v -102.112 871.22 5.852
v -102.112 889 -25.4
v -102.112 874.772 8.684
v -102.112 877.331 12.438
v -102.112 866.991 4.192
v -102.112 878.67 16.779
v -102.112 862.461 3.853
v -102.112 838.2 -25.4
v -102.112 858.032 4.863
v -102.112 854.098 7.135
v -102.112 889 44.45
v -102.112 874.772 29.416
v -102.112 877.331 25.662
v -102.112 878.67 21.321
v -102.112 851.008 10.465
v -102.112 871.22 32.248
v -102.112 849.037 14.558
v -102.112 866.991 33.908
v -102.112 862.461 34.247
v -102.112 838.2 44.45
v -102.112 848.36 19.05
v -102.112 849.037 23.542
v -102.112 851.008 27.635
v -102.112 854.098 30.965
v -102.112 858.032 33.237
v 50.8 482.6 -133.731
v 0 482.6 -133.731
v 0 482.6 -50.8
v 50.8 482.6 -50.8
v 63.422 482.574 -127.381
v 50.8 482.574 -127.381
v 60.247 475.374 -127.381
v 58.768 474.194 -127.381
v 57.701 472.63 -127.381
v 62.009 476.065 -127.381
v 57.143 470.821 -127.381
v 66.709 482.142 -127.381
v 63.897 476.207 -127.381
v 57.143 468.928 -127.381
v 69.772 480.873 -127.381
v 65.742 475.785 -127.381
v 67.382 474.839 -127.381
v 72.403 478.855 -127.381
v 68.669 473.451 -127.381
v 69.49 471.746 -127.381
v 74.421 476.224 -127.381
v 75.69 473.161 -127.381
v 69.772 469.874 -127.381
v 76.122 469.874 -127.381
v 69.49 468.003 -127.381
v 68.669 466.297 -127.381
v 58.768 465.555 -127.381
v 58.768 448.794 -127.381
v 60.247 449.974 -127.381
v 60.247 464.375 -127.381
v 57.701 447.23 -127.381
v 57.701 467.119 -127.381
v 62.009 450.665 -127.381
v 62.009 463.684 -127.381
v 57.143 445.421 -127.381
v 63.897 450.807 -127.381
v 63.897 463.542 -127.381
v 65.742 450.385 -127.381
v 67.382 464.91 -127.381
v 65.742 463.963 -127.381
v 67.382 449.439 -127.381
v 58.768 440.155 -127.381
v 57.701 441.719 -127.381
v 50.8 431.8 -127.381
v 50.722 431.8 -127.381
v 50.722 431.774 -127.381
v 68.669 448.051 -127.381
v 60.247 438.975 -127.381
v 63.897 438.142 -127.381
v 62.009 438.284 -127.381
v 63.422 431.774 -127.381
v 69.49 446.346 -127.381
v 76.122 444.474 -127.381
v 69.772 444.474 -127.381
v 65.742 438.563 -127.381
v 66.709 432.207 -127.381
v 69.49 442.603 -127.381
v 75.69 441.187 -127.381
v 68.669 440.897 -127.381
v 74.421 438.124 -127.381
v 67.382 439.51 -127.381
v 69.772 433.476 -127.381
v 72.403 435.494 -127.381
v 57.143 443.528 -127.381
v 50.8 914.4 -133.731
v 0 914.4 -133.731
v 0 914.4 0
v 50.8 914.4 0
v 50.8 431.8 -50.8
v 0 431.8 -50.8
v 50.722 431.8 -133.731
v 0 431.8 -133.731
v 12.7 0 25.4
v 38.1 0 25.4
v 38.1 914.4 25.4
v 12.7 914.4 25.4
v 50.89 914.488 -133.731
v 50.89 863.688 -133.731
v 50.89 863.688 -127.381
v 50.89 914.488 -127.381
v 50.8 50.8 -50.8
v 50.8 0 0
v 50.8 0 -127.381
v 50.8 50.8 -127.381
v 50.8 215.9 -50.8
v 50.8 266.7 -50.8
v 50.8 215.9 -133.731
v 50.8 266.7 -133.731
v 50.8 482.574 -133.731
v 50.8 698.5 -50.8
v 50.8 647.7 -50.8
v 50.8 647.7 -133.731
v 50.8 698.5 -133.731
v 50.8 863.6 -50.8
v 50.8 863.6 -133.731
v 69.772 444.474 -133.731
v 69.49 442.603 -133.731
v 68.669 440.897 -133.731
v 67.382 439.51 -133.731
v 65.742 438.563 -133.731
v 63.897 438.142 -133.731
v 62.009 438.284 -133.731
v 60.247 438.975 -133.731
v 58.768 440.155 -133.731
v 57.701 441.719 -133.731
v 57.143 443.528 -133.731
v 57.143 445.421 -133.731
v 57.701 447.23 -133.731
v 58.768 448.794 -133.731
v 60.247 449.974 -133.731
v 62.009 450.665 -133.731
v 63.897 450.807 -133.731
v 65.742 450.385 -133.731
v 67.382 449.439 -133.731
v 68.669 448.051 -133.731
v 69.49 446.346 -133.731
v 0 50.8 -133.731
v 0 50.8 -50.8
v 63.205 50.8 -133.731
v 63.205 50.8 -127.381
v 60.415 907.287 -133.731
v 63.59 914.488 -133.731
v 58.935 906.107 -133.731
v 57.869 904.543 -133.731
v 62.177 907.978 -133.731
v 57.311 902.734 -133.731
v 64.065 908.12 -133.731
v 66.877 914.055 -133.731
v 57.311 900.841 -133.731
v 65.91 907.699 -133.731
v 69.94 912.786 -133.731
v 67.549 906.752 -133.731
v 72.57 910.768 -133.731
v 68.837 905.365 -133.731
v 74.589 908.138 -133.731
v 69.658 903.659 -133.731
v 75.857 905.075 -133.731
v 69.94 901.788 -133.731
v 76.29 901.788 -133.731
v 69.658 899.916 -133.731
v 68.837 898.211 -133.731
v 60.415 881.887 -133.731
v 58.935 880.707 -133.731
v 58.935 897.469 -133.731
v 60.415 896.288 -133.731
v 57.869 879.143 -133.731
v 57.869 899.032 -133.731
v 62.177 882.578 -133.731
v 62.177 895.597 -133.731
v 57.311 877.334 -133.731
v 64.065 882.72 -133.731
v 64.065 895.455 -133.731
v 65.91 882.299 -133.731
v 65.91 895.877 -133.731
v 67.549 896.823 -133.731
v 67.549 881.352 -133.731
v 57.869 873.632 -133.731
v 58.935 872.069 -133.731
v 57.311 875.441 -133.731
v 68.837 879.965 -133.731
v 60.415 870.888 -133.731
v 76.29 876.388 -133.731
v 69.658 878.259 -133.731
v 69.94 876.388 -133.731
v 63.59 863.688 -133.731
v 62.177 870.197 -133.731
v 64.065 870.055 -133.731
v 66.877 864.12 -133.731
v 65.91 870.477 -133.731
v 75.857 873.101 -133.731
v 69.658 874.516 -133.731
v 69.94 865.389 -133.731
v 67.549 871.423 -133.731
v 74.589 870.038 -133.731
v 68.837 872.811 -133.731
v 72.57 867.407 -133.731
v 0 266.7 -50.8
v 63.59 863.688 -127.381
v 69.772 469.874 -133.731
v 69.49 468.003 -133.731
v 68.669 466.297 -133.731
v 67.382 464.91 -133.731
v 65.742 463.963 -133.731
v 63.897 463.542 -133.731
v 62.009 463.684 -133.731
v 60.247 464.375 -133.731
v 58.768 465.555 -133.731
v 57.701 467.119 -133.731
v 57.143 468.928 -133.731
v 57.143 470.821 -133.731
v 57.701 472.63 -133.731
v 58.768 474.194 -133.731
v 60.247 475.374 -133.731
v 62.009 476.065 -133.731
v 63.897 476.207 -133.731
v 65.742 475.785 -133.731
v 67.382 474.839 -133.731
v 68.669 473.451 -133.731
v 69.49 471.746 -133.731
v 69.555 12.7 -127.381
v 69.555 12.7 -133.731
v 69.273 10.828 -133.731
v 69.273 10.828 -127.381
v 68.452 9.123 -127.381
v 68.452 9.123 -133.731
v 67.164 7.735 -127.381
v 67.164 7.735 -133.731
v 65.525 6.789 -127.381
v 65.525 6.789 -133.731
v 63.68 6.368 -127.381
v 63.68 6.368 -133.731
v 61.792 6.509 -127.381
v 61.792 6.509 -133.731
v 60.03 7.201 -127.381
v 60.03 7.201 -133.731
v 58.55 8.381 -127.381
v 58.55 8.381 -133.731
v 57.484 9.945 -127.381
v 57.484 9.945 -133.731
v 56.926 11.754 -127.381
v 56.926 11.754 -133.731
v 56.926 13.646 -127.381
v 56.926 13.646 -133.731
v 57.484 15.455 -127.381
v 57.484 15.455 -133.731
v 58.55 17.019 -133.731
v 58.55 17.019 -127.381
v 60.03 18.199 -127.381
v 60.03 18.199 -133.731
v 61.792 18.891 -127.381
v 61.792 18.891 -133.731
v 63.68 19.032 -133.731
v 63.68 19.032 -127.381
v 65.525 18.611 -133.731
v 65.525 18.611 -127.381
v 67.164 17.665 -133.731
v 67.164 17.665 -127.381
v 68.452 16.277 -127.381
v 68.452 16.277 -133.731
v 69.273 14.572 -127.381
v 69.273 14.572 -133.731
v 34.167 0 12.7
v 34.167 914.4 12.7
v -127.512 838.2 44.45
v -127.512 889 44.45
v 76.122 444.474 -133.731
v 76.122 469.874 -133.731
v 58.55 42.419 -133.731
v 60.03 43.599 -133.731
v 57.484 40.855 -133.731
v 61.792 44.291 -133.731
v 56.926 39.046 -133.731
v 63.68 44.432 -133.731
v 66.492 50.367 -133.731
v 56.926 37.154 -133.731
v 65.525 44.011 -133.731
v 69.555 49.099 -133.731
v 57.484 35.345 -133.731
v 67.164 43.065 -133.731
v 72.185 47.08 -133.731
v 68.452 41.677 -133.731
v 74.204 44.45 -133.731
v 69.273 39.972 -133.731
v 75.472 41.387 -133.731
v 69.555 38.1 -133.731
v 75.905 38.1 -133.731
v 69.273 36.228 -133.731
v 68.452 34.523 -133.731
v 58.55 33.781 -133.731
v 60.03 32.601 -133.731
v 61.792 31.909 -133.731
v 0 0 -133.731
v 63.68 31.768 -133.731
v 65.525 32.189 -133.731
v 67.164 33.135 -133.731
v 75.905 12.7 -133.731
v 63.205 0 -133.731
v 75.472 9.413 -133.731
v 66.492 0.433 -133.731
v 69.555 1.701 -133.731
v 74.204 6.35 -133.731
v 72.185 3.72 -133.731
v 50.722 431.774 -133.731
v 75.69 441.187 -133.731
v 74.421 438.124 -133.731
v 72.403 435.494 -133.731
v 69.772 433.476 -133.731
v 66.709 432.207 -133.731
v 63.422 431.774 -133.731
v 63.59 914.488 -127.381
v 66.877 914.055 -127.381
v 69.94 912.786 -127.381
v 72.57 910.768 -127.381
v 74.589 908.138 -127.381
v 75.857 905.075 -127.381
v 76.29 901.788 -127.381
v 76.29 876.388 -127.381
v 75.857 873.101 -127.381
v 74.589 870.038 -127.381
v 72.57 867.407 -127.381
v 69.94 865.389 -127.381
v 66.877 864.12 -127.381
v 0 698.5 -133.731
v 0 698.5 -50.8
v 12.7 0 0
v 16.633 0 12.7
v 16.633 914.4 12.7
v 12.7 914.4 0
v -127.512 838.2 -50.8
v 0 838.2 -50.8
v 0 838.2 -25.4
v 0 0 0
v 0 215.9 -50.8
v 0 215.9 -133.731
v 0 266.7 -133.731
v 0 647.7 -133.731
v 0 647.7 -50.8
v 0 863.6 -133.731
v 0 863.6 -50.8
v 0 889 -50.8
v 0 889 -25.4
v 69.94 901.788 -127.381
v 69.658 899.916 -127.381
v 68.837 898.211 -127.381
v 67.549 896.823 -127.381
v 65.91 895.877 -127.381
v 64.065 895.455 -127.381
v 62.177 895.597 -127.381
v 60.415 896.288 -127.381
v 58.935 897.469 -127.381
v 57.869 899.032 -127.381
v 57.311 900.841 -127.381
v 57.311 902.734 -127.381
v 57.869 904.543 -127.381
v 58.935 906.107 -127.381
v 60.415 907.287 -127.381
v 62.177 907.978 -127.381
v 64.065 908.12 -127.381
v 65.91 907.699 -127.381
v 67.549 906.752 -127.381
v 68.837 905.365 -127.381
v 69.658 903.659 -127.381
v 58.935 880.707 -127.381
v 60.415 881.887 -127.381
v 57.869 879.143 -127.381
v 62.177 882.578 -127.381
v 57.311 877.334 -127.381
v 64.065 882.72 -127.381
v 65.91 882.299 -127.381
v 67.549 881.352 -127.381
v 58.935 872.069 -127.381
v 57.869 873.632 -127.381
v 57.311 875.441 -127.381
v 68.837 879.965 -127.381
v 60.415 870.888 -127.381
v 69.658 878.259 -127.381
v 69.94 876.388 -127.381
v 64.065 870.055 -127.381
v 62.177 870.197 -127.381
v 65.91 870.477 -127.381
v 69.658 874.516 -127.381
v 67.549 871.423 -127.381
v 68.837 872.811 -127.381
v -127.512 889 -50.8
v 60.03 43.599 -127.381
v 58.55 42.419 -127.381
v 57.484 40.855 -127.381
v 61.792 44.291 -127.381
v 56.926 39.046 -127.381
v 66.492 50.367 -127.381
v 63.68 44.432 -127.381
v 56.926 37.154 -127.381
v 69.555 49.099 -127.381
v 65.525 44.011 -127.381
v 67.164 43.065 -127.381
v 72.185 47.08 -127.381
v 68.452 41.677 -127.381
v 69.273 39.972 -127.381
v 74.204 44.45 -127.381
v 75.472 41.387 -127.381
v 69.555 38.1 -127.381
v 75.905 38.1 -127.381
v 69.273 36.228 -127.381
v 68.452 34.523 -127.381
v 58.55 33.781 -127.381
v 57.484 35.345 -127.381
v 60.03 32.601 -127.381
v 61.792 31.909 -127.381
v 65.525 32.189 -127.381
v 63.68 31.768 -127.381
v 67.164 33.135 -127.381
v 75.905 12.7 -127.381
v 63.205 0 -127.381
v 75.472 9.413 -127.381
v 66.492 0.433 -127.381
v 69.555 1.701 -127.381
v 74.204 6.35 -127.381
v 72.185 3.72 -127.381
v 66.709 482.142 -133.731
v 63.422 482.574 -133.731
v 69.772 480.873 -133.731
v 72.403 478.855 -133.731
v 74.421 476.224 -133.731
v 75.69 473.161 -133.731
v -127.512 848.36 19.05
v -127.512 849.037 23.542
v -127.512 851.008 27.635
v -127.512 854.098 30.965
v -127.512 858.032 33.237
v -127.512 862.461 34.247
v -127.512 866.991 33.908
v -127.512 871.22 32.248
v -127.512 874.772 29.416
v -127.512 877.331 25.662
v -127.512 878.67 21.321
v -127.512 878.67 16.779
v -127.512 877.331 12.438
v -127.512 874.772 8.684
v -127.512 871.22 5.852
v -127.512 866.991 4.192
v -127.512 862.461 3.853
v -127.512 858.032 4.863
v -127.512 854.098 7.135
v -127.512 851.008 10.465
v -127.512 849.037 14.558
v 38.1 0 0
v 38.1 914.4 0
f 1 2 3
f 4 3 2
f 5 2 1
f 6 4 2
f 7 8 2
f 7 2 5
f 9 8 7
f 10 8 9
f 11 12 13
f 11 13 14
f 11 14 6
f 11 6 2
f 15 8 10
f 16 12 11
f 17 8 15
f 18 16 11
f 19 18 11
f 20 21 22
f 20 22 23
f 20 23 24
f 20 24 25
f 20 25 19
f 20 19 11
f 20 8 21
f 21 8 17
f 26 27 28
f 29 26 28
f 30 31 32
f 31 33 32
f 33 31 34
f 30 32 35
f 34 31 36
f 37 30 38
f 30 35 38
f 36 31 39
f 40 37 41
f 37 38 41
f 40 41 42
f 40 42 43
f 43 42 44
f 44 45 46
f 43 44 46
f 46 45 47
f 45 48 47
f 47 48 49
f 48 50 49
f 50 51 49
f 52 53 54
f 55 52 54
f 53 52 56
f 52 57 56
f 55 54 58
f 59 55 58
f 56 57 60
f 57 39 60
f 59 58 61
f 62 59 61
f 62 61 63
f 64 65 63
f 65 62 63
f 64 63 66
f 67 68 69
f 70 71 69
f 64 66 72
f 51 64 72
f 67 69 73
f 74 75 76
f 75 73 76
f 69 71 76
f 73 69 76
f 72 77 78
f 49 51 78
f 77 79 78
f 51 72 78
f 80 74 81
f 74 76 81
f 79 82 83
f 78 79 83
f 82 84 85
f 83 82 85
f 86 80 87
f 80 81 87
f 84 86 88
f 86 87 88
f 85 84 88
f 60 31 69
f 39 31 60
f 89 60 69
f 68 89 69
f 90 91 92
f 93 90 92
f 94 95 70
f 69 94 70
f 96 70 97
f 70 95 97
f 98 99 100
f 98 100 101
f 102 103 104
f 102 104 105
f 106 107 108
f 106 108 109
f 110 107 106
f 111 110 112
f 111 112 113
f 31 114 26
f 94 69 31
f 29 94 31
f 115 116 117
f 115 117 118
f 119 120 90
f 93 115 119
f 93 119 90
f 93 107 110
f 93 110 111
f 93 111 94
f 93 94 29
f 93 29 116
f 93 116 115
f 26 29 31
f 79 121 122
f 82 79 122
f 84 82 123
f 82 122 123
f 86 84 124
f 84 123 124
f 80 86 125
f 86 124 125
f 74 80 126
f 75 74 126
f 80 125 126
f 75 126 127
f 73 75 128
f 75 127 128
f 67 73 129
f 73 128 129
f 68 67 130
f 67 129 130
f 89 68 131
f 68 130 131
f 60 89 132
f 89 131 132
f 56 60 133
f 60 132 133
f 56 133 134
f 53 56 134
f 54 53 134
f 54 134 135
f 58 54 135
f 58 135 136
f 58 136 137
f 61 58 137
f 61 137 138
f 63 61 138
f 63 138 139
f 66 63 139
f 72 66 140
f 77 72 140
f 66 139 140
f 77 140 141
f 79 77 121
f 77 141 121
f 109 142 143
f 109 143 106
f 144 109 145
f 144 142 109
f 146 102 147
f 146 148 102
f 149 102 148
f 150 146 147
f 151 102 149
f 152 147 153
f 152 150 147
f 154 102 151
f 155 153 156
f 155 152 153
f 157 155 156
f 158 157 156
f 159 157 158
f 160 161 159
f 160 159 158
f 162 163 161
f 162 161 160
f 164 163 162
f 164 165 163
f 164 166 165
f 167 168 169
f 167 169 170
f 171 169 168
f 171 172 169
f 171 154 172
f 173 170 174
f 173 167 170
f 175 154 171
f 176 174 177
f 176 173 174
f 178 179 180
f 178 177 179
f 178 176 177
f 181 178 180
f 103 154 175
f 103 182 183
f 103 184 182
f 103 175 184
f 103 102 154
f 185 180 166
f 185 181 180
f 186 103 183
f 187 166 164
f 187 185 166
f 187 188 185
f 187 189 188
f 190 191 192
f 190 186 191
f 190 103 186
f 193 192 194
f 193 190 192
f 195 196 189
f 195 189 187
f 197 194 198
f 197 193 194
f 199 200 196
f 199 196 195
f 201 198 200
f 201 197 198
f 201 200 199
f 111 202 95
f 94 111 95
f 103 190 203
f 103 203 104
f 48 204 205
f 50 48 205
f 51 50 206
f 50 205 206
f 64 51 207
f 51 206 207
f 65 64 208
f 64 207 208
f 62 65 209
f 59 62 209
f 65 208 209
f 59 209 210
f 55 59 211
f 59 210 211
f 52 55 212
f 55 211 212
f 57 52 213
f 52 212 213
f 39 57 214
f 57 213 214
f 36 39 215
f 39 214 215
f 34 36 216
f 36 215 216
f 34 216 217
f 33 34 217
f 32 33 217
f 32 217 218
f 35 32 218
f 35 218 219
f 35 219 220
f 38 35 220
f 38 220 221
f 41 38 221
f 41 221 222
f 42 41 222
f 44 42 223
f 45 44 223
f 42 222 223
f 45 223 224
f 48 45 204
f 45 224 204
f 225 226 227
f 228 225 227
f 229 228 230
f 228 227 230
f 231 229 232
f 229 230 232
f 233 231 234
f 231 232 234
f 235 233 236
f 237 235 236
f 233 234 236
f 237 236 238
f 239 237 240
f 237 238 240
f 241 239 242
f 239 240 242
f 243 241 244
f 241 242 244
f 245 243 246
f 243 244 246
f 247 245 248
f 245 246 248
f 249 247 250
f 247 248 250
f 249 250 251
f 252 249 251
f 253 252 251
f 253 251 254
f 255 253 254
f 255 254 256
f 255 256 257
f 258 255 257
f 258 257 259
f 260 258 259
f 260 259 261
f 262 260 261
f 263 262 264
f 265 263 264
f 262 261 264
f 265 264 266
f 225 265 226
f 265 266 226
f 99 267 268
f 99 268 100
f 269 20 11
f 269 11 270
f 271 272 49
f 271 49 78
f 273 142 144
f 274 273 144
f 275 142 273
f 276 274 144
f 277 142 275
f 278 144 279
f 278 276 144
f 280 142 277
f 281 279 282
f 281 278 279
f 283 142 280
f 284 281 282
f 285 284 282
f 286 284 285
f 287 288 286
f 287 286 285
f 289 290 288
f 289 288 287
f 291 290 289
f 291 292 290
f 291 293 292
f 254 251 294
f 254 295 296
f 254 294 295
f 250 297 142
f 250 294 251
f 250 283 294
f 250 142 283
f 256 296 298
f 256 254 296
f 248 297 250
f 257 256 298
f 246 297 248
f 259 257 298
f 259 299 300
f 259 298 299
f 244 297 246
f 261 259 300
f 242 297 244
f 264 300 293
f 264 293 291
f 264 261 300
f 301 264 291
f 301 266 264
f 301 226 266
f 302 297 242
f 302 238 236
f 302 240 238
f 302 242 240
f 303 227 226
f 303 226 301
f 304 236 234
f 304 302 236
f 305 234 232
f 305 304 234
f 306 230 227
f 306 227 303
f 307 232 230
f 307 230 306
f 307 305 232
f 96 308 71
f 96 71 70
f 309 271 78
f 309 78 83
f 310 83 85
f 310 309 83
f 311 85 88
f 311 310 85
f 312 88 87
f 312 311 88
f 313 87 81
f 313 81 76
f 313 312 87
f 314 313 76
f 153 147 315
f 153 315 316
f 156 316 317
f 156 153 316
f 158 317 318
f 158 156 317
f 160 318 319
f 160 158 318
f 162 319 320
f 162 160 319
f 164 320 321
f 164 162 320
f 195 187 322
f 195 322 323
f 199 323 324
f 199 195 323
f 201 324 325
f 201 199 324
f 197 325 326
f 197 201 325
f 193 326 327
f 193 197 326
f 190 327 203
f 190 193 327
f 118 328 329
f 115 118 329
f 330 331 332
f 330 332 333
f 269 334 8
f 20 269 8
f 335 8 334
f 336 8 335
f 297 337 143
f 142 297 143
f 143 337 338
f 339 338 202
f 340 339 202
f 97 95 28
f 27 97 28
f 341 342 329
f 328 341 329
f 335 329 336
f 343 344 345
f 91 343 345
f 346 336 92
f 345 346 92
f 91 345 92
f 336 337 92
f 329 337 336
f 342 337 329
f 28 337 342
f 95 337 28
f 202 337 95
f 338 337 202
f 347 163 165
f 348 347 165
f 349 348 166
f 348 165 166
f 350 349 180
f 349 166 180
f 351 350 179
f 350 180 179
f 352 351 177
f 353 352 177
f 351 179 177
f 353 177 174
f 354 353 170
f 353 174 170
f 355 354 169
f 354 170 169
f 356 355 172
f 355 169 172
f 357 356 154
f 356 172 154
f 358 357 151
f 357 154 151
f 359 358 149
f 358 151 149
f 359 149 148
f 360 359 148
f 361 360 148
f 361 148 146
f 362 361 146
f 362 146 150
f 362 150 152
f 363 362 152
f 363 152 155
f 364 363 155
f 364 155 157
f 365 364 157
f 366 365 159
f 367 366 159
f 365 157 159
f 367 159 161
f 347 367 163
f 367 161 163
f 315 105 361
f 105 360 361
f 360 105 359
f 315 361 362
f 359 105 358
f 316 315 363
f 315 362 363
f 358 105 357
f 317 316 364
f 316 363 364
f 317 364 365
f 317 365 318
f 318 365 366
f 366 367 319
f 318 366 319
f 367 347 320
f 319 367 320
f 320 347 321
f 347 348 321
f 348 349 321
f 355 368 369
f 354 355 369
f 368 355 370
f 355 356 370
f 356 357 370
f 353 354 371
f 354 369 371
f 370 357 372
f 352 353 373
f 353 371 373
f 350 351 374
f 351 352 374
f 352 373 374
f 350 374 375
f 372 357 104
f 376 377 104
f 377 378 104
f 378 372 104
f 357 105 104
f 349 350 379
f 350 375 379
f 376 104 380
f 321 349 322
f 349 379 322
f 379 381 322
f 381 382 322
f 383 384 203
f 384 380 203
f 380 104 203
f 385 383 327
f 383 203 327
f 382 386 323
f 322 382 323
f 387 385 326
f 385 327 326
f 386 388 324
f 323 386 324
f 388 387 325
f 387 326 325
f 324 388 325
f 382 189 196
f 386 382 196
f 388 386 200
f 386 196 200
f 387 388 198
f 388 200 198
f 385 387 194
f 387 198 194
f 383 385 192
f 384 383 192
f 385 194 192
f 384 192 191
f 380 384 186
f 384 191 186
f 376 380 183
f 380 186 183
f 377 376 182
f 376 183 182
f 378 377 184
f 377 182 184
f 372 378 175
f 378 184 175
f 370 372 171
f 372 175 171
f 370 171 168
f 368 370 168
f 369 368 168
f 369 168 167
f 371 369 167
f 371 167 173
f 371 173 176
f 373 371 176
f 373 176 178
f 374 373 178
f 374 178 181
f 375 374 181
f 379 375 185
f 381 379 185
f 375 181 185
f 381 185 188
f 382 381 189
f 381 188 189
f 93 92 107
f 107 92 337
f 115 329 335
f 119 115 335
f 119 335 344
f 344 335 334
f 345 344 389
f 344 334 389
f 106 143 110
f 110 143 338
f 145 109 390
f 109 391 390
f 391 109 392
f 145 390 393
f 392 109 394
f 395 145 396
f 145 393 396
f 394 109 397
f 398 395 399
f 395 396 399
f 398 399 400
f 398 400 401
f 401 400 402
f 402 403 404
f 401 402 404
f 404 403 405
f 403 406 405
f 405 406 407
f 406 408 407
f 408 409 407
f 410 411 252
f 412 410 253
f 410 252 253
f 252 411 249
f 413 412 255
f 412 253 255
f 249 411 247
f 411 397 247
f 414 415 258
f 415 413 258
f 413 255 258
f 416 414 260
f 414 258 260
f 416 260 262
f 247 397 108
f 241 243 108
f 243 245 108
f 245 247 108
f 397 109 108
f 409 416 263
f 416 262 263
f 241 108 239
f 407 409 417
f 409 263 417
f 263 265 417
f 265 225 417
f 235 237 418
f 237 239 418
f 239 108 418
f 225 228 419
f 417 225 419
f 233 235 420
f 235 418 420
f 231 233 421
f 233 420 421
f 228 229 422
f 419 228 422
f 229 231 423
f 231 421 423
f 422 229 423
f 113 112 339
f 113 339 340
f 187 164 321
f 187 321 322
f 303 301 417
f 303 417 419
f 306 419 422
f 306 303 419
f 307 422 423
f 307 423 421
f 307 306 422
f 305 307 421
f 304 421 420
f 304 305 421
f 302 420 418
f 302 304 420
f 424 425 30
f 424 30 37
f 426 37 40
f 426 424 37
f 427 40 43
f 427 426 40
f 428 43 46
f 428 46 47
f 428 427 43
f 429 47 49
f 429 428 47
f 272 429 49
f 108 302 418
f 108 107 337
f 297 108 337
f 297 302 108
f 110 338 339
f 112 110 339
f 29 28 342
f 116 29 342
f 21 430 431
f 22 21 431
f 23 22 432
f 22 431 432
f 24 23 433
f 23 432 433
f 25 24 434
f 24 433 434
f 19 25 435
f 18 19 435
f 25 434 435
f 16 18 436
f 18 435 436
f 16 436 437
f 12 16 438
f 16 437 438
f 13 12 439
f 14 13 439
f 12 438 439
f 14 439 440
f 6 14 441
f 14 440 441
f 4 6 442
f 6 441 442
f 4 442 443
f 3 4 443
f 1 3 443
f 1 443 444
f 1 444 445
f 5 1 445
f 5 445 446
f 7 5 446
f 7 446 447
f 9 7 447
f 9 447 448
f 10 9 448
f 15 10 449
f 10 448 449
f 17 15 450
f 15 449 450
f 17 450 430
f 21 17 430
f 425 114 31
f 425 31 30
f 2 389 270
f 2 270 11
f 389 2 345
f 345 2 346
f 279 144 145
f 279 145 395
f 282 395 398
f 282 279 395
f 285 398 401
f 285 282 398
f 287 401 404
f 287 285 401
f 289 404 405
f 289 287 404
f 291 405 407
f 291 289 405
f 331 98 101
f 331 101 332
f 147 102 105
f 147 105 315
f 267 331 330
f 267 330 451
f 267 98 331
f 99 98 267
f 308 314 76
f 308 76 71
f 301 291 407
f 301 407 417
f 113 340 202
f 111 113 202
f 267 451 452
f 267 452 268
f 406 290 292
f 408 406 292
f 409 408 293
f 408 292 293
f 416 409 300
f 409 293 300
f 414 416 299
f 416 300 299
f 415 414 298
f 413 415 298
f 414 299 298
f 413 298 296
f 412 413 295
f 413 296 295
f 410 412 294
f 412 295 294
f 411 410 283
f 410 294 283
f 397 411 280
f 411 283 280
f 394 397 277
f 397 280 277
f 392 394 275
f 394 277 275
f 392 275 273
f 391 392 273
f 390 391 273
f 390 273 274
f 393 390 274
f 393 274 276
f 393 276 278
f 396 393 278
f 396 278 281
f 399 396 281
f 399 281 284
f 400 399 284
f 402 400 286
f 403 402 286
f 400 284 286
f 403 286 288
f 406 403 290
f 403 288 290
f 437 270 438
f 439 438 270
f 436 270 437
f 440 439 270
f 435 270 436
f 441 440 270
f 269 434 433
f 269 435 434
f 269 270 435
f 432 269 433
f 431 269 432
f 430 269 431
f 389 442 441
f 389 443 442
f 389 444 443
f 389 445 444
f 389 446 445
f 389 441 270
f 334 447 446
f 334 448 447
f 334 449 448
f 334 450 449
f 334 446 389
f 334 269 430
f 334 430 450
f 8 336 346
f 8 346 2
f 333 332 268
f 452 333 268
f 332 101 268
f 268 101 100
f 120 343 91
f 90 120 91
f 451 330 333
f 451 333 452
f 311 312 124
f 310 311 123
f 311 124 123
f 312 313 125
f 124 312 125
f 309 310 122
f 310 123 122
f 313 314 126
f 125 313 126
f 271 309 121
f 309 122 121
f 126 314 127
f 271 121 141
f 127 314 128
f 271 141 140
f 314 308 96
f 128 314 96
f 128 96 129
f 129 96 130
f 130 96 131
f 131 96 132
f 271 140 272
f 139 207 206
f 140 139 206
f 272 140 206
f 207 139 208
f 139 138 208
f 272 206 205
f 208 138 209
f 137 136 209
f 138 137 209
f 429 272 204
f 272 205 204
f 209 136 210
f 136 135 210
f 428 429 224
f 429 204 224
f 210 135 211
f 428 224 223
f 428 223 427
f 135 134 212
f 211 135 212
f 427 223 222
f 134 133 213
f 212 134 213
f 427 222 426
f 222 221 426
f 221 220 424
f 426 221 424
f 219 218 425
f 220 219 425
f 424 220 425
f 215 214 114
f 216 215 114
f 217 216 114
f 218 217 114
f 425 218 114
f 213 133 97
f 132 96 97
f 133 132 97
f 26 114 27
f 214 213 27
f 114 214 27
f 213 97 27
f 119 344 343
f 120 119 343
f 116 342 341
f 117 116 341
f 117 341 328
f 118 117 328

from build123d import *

# Parameters (mm, degrees)
F1_DEPTH  = 50.8
F3_DEPTH  = 914.4
F5_W      = 50.2879026413
F5_H      = 25.4
F6_DEPTH  = 50.8
F8_R      = 6.35
F9_DEPTH  = 6.35
F11_R     = 15.24
F12_DEPTH = 25.4


with BuildPart() as f1:
    # F0 (on Right) → F1 (new body)
    with BuildSketch(Plane.YZ):
        Polygon((914.4, 0), (0, 0), (0, -133.731), (50.8, -133.731), (50.8, -50.8), (215.9, -50.8), (215.9, -133.731), (266.7, -133.731), (266.7, -50.8), (431.8, -50.8), (431.8, -133.731), (482.6, -133.731), (482.6, -50.8), (647.7, -50.8), (647.7, -133.731), (698.5, -133.731), (698.5, -50.8), (863.6, -50.8), (863.6, -133.731), (914.4, -133.731), align=None)
    extrude(amount=F1_DEPTH)

    # F5 (on offset) → F6 (join)
    with BuildSketch(Plane.XZ.offset(-838.2)):
        with Locations((25.1439513206, -38.1)):
            Rectangle(F5_W, F5_H)
        Polygon((0, -50.8), (0, -25.4), (-102.1120973587, -25.4), (-102.1120973587, 44.45), (-127.5120973587, 44.45), (-127.5120973587, -50.8), align=None)
    extrude(amount=-F6_DEPTH)

    # F8 (on offset) → F9 (join)
    with BuildSketch(Plane(origin=(0, 0, -133.731), x_dir=(1, 0, 0), z_dir=(0, 0, -1))):
        with BuildLine():
            Line((63.2052357912, 0), (50.5052357912, 0))
            Line((50.5052357912, 0), (50.5052357912, -50.8))
            Line((50.5052357912, -50.8), (63.2052357912, -50.8))
            ThreePointArc((63.2052357912, -50.8), (72.1854919123, -47.0802561211), (75.9052357912, -38.1))
            Line((75.9052357912, -38.1), (75.9052357912, -12.7))
            ThreePointArc((75.9052357912, -12.7), (72.1854919123, -3.7197438789), (63.2052357912, 0))
        make_face()
        with Locations((63.2052357912, -38.1)):
            Circle(F8_R, mode=Mode.SUBTRACT)
        with Locations((63.2052357912, -12.7)):
            Circle(F8_R, mode=Mode.SUBTRACT)
        with BuildLine():
            Line((63.4224947214, -431.774403286), (50.7224947214, -431.774403286))
            Line((50.7224947214, -431.774403286), (50.7224947214, -482.574403286))
            Line((50.7224947214, -482.574403286), (63.4224947214, -482.574403286))
            ThreePointArc((63.4224947214, -482.574403286), (72.4027508425, -478.854659407), (76.1224947214, -469.874403286))
            Line((76.1224947214, -469.874403286), (76.1224947214, -444.474403286))
            ThreePointArc((76.1224947214, -444.474403286), (72.4027508425, -435.4941471649), (63.4224947214, -431.774403286))
        make_face()
        with Locations((63.4224947214, -469.874403286)):
            Circle(F8_R, mode=Mode.SUBTRACT)
        with Locations((63.4224947214, -444.474403286)):
            Circle(F8_R, mode=Mode.SUBTRACT)
    extrude(amount=-F9_DEPTH)

    # F11 (on face) → F12 (cut)
    with BuildSketch(Plane(origin=(-127.5120973587, 0, 0), x_dir=(0, -1, 0), z_dir=(-1, 0, 0))):
        with Locations((-863.6, 19.05)):
            Circle(F11_R)
    extrude(amount=-F12_DEPTH, mode=Mode.SUBTRACT)


with BuildPart() as f3:
    # F2 (on Front) → F3 (new body)
    with BuildSketch(Plane.XZ):
        Polygon((16.6332703084, 12.7), (12.7, 0), (38.1, 0), (34.1667296916, 12.7), (38.1, 25.4), (12.7, 25.4), align=None)
    extrude(amount=-F3_DEPTH)


with BuildPart() as f9:
    # F8 (on offset) → F9, piece 2 (new body)
    with BuildSketch(Plane(origin=(0, 0, -133.731), x_dir=(1, 0, 0), z_dir=(0, 0, -1))):
        with BuildLine():
            Line((50.8901067078, -863.6876599312), (50.8901067078, -914.4876599312))
            Line((50.8901067078, -914.4876599312), (63.5901067078, -914.4876599312))
            ThreePointArc((63.5901067078, -914.4876599312), (72.5703628289, -910.7679160523), (76.2901067078, -901.7876599312))
            Line((76.2901067078, -901.7876599312), (76.2901067078, -876.3876599312))
            ThreePointArc((76.2901067078, -876.3876599312), (72.5703628289, -867.4074038101), (63.5901067078, -863.6876599312))
            Line((63.5901067078, -863.6876599312), (50.8901067078, -863.6876599312))
        make_face()
        with Locations((63.5901067078, -901.7876599312)):
            Circle(F8_R, mode=Mode.SUBTRACT)
        with Locations((63.5901067078, -876.3876599312)):
            Circle(F8_R, mode=Mode.SUBTRACT)
    extrude(amount=-F9_DEPTH)


solid = Compound([f1.part, f3.part, f9.part])
